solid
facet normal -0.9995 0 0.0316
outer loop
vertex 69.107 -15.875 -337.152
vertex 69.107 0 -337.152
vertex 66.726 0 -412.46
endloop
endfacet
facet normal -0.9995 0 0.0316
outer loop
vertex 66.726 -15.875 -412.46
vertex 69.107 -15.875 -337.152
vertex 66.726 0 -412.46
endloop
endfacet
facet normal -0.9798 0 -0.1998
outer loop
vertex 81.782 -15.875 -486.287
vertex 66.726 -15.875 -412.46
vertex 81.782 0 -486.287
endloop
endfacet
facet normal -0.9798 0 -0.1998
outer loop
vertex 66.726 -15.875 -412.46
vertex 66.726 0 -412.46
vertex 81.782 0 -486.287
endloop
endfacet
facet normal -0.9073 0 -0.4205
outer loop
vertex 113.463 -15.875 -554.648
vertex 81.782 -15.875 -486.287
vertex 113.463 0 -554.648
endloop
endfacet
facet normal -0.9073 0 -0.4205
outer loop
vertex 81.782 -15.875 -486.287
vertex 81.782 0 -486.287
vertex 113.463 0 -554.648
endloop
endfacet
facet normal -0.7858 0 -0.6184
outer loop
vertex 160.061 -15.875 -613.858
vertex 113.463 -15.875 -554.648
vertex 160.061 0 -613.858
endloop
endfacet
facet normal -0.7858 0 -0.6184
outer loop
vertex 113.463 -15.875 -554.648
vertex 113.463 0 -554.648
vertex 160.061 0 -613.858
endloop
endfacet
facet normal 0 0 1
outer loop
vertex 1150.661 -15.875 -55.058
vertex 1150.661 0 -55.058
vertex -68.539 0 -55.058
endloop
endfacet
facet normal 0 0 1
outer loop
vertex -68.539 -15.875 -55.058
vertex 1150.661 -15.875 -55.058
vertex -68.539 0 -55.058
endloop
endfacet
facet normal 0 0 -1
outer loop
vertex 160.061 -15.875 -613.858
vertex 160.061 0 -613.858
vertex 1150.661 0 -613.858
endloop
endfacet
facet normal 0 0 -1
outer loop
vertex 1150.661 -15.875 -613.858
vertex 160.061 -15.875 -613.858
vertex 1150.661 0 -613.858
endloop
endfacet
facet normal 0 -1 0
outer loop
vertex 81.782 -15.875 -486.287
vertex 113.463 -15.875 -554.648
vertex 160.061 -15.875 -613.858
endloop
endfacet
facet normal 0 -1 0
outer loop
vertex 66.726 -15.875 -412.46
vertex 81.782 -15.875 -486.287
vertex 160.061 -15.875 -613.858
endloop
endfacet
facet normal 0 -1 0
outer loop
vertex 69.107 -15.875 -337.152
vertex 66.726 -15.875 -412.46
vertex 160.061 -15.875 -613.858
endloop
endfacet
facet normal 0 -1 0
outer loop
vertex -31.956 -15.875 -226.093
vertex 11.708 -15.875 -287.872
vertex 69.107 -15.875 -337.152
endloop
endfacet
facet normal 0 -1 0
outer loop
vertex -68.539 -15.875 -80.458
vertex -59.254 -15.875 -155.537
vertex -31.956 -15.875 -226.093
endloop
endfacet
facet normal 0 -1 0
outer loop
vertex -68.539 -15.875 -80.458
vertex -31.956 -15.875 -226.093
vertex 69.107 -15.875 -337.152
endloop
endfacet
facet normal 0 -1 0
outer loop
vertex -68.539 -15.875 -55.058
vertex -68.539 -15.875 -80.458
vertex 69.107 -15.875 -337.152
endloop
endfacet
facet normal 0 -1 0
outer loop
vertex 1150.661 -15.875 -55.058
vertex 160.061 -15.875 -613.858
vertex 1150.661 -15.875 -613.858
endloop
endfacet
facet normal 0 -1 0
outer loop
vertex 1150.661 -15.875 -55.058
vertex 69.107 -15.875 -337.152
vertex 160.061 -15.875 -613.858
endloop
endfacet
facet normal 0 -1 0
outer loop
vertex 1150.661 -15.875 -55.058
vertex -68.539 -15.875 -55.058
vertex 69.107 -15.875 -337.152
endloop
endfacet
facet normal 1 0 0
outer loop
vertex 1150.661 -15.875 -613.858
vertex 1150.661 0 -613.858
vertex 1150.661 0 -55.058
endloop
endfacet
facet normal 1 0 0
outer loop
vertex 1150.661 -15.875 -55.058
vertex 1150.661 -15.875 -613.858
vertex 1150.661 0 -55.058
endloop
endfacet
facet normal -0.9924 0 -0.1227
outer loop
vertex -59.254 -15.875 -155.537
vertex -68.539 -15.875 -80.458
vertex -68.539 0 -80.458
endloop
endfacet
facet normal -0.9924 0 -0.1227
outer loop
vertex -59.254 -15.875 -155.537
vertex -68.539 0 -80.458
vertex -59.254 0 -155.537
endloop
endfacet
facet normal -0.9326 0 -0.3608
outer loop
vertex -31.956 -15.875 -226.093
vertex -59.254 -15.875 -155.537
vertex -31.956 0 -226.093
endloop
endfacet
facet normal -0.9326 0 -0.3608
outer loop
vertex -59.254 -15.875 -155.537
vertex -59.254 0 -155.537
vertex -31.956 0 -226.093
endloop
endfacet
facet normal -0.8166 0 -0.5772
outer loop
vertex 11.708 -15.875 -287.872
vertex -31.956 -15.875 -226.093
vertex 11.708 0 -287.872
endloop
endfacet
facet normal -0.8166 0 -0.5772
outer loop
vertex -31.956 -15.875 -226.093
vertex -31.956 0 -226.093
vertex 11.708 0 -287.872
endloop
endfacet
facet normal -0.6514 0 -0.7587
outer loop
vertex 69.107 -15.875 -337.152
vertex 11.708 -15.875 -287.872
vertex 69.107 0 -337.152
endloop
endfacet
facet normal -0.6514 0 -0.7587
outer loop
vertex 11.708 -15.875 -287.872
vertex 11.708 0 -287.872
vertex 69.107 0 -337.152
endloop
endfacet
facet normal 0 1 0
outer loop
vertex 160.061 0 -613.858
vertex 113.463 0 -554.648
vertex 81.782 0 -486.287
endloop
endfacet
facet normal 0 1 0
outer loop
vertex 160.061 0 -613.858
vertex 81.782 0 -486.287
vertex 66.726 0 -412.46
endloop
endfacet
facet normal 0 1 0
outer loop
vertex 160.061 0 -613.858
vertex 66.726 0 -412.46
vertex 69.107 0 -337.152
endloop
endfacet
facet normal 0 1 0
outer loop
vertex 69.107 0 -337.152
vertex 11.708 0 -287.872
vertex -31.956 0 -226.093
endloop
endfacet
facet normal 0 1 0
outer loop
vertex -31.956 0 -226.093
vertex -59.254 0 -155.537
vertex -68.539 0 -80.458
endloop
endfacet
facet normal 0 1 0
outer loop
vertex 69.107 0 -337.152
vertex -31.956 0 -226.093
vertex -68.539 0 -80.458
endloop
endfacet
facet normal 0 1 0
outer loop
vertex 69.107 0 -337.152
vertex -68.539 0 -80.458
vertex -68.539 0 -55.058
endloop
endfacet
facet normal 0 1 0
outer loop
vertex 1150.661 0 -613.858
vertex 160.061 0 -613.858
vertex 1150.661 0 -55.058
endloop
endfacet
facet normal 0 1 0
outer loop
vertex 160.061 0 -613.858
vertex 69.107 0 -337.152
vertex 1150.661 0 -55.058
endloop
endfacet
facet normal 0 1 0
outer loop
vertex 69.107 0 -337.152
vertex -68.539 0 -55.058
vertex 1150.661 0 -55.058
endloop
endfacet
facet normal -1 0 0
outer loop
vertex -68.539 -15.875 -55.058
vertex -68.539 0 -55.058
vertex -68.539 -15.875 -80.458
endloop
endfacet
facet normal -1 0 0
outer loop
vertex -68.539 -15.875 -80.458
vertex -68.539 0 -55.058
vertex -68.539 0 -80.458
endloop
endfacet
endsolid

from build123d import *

# Parameters (mm, degrees)
F1_DEPTH = 15.875


with BuildPart() as f1:
    # F0 (on Front) → F1 (new body)
    with BuildSketch(Plane.XZ):
        with BuildLine():
            Line((1150.660626, -55.057509), (-68.539374, -55.057509))
            Line((-68.539374, -55.057509), (-68.539374, -80.457509))
            ThreePointArc((-68.539374, -80.457509), (-31.956463, -226.092789), (69.10691, -337.151958))
            ThreePointArc((69.10691, -337.151958), (81.782103, -486.286712), (160.060626, -613.857509))
            Line((160.060626, -613.857509), (1150.660626, -613.857509))
            Line((1150.660626, -613.857509), (1150.660626, -55.057509))
        make_face()
    extrude(amount=F1_DEPTH)


solid = f1.part
